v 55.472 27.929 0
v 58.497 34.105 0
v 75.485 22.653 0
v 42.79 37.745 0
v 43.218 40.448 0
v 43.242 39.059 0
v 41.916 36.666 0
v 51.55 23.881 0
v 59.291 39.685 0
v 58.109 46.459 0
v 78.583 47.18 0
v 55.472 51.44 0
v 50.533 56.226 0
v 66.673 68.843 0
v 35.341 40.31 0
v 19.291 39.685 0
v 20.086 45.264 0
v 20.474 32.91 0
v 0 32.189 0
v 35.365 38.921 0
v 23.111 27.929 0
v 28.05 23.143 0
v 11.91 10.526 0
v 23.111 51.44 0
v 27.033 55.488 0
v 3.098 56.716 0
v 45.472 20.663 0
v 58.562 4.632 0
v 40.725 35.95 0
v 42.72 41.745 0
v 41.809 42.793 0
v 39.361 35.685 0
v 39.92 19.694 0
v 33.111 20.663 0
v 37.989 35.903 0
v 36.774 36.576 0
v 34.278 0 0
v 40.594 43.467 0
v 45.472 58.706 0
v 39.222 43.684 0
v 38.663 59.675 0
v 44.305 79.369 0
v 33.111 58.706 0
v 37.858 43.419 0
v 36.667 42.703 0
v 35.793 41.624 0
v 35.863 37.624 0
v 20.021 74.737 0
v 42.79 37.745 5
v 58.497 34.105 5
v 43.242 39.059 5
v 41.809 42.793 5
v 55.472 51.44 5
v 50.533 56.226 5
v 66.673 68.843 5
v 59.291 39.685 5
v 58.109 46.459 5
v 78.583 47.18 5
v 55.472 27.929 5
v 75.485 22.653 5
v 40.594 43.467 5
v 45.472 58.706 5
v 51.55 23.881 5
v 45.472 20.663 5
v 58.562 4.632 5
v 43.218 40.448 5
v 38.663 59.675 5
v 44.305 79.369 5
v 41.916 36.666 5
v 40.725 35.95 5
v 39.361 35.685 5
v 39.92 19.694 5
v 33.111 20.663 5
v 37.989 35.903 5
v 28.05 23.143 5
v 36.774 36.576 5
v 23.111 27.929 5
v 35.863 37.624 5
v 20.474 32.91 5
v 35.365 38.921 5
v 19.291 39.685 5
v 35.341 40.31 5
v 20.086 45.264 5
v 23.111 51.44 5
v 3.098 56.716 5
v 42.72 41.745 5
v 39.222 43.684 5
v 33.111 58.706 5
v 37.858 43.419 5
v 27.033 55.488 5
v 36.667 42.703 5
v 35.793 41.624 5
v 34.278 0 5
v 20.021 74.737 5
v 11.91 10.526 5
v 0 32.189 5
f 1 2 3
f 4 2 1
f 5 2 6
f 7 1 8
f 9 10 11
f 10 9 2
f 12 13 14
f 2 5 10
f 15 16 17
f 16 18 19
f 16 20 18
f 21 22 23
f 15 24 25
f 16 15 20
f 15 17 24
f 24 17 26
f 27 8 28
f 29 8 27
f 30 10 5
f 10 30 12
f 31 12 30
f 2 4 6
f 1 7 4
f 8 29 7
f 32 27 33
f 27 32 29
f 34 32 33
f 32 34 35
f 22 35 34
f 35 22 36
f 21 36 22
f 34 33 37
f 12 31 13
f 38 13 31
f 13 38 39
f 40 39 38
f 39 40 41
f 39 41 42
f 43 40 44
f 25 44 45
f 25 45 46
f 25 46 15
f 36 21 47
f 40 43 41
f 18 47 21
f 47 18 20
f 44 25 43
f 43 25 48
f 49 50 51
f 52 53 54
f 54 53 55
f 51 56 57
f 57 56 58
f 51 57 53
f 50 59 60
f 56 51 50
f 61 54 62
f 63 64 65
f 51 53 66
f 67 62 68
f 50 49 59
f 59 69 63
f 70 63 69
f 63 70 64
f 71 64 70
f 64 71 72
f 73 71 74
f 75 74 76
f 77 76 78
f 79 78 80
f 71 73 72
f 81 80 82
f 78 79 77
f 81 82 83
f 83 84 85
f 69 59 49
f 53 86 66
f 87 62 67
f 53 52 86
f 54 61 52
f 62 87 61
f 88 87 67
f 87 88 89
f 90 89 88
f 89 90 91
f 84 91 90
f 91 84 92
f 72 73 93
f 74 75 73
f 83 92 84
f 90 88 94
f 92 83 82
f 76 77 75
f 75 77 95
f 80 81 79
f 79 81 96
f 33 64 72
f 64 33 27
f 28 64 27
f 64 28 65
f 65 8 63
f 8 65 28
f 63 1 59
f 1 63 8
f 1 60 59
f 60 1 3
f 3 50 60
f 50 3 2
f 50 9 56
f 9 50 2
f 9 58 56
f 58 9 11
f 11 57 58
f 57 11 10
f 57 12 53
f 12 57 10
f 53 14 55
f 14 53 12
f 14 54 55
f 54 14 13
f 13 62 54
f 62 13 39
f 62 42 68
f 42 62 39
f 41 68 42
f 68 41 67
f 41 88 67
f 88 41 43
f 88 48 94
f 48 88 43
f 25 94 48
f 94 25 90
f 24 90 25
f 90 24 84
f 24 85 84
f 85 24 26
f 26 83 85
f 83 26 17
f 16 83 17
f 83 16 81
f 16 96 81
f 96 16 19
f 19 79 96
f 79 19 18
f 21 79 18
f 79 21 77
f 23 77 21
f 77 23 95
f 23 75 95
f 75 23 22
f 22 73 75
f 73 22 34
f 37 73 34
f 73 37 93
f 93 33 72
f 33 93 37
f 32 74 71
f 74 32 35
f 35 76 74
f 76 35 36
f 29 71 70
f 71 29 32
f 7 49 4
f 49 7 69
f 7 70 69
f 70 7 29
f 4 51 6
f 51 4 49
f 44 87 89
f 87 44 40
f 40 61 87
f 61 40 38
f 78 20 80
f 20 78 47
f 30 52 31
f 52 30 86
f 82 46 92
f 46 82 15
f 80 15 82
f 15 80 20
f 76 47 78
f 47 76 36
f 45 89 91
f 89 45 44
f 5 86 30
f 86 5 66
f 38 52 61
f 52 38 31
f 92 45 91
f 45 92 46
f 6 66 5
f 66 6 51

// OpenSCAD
$fn = 32;

// ----------------------------------------------------------------------
// Star wheel: 10-point ratchet, R40
// ----------------------------------------------------------------------

// --- parameters (mm) ---
n_points = 10;            // number of points / teeth
r_out = 40;               // tip radius
r_in = 20;                // root radius
bore_r = 4;               // centre bore radius
plate_t = 5;              // plate thickness, Z (extrusion height)
bore_d = 8;               // centre bore diameter
fit_tol = 0.02;           // declared fit tolerance (prompt contract)
free_tol = 0.2;           // declared free tolerance (prompt contract)

profile = [[59.291, 39.685], [78.583, 47.18], [58.109, 46.459], [55.472, 51.44], [66.673, 68.843], [50.533, 56.226], [45.472, 58.706], [44.305, 79.369], [38.663, 59.675], [33.111, 58.706], [20.021, 74.737], [27.033, 55.488], [23.111, 51.44], [3.098, 56.716], [20.086, 45.264], [19.291, 39.685], [0, 32.189], [20.474, 32.91], [23.111, 27.929], [11.91, 10.526], [28.05, 23.143], [33.111, 20.663], [34.278, 0], [39.92, 19.694], [45.472, 20.663], [58.562, 4.632], [51.55, 23.881], [55.472, 27.929], [75.485, 22.653], [58.497, 34.105]];  // primary outline, 30 points, counter clockwise
void_1 = [[43.218, 40.448], [42.72, 41.745], [41.809, 42.793], [40.594, 43.467], [39.222, 43.684], [37.858, 43.419], [36.667, 42.703], [35.793, 41.624], [35.341, 40.31], [35.365, 38.921], [35.863, 37.624], [36.774, 36.576], [37.989, 35.903], [39.361, 35.685], [40.725, 35.95], [41.916, 36.666], [42.79, 37.745], [43.242, 39.059]];  // centre bore, 18 points

// --- the one profile operation ---
difference() {
  linear_extrude(height = plate_t) polygon(points = profile);
  translate([0, 0, -1])
    linear_extrude(height = plate_t + 2) polygon(points = void_1);
}
